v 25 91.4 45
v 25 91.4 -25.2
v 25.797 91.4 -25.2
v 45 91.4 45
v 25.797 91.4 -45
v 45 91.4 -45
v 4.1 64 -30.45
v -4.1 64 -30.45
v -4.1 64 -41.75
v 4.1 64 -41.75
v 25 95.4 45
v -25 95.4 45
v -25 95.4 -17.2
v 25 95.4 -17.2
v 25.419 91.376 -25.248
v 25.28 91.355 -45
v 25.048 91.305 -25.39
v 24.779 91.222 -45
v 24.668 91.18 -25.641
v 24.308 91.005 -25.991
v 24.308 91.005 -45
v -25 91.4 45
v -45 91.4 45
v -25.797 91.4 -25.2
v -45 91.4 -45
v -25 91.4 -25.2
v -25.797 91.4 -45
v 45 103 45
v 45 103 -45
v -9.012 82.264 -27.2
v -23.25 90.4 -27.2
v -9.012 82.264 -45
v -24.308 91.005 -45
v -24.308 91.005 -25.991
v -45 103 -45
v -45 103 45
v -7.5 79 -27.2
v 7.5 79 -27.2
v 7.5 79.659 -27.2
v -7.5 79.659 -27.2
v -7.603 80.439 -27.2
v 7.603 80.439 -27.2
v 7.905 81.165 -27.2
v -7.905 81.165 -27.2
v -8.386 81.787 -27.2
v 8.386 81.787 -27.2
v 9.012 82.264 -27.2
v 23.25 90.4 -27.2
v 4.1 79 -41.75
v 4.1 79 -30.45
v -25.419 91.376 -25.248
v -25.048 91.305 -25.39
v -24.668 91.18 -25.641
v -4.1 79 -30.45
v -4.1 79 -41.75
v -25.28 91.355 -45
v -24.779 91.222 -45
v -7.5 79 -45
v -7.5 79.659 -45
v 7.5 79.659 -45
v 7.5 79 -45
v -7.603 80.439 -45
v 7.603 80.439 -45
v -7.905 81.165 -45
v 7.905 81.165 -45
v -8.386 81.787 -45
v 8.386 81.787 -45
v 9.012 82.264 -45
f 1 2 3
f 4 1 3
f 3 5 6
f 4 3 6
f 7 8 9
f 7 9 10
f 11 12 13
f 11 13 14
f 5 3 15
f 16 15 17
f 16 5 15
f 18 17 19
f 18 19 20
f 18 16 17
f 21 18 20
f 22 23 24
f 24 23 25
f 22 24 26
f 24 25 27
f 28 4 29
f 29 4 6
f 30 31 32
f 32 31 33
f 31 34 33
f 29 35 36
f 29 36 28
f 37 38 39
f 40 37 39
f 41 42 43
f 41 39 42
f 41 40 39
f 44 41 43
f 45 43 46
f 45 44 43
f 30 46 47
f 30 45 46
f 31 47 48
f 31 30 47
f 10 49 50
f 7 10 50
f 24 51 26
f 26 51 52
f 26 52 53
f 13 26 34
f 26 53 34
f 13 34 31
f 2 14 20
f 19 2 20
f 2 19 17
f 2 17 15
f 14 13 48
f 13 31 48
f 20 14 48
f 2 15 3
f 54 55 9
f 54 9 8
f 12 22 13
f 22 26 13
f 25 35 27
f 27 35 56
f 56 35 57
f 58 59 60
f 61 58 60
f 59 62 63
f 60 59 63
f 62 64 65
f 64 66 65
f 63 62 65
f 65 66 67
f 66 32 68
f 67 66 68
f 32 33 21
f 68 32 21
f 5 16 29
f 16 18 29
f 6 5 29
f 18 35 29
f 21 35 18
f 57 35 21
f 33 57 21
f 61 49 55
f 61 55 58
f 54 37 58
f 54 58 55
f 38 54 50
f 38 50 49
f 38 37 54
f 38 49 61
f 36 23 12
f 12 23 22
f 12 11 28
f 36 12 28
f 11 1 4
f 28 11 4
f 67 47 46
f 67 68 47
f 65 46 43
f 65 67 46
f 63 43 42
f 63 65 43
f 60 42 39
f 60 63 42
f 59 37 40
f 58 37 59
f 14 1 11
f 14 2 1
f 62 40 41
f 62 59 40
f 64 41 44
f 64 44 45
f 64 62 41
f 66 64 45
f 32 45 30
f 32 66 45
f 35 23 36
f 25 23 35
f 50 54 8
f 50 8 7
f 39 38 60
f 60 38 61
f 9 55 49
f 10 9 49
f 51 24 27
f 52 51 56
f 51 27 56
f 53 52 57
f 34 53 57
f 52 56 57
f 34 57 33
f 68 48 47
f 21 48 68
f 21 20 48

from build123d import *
from OCP.BRepFilletAPI import BRepFilletAPI_MakeChamfer

# Parameters (mm, degrees)
ESQUISSE2_W             = 90
ESQUISSE2_H             = 90
BOSS_EXTRU_1_DEPTH      = 4
ESQUISSE3_W             = 9.2
ESQUISSE3_H             = 10.3
BOSS_EXTRU_2_DEPTH      = 2.4
CONG_1_R                = 1
ESQUISSE5_W             = 14.85
ESQUISSE5_H             = 90
BOSS_EXTRU_3_DEPTH      = 2.4
ESQUISSE6_W             = 7
ESQUISSE6_H             = 5
BOSS_EXTRU_4_DEPTH      = 38
ESQUISSE8_W             = 14.85
ESQUISSE8_H             = 18
BOSS_EXTRU_5_DEPTH      = 38
BOSS_EXTRU_6_REACH      = 97.814
ESQUISSE9_W             = 7
ESQUISSE9_H             = 2
CONG_1_OF_SYM_TRIE1_R   = 1
ENL_V_MAT_EXTRU_1_REACH = 111.983
ESQUISSE10_W            = 2
ESQUISSE10_H            = 18
ENL_V_MAT_EXTRU_2_REACH = 77.38
ESQUISSE11_W            = 40
ESQUISSE11_H            = 18
ESQUISSE12_W            = 5
ESQUISSE12_H            = 8.6
BOSS_EXTRU_7_DEPTH      = 60.3
ESQUISSE13_W            = 6.9
ESQUISSE13_H            = 7.6
BOSS_EXTRU_8_DEPTH      = 2.45
CONG_2_R                = 1
CONG_2_OF_SYM_TRIE2_R   = 1
BOSS_EXTRU_9_DEPTH      = 3
BOSS_EXTRU_9_DEPTH_BACK = 3
ESQUISSE14_W            = 90
ESQUISSE14_H            = 17.8
ESQUISSE15_W            = 15
ESQUISSE15_H            = 17.8
BOSS_EXTRU_10_DEPTH     = 44
ESQUISSE16_W            = 90
ESQUISSE16_H            = 90
BOSS_EXTRU_11_DEPTH     = 11.6
ESQUISSE20_W            = 12
ESQUISSE20_H            = 6.4
BOSS_EXTRU_13_DEPTH     = 10
ESQUISSE21_W            = 12
ESQUISSE21_H            = 6.4
BOSS_EXTRU_14_DEPTH     = 10
CONG_3_R                = 6
ENL_V_MAT_EXTRU_4_REACH = 126.022
ESQUISSE23_R            = 2.3
CONG_3_OF_SYM_TRIE3_R   = 6
ENL_V_MAT_EXTRU_5_REACH = 126.022
ESQUISSE24_R            = 1.75
ENL_V_MAT_EXTRU_6_REACH = 137.909
ESQUISSE26_R            = 1.75
ESQUISSE27_W            = 50
ESQUISSE27_H            = 4
ENL_V_MAT_EXTRU_7_DEPTH = 72.2
CHANFREIN3_SIZE         = 28.5
CHANFREIN3_SIZE2        = 9.5
CHANFREIN4_SIZE         = 10
CHANFREIN4_SIZE2        = 17.5
CHANFREIN8_START        = -45
CHANFREIN8_DEPTH        = 17.8
CHANFREIN9_SIZE         = 3
CHANFREIN9_SIZE_2       = 9
CHANFREIN10_START       = 25.930676813
CHANFREIN10_OUTLINE_W   = 40
CHANFREIN10_OUTLINE_H   = 3.16227766
CHANFREIN10_DEPTH       = 2.069323187
CONG_9_R                = 3
ESQUISSE37_R            = 4
ENL_V_MAT_EXTRU_8_DEPTH = 3
BOSS_EXTRU_15_DEPTH     = 4.8
CONG_11_R               = 3
CHANFREIN14_SIZE        = 10
CHANFREIN14_SIZE2       = 5
ESQUISSE39_W            = 110.537037217
ESQUISSE39_H            = 103.424550411
ENL_V_MAT_EXTRU_9_DEPTH = 79
ESQUISSE40_W            = 8.2
ESQUISSE40_H            = 11.3
BOSS_EXTRU_16_DEPTH     = 15


with BuildPart() as part:
    # Esquisse2 → Boss.-Extru.1 (new body)
    with BuildSketch(Plane(origin=(0, 0, 0), x_dir=(1, 0, 0), z_dir=(0, 1, 0))):
        Rectangle(ESQUISSE2_W, ESQUISSE2_H)
    extrude(amount=BOSS_EXTRU_1_DEPTH)

    # Esquisse3 → Boss.-Extru.2 (add)
    with BuildSketch(Plane(origin=(0, 4, 0), x_dir=(1, 0, 0), z_dir=(0, 1, 0))):
        with Locations((25.55, -6)):
            Rectangle(ESQUISSE3_W, ESQUISSE3_H)
    boss_extru_2 = extrude(amount=BOSS_EXTRU_2_DEPTH)

    # Congé1
    cong_1_edges = [part.edges().sort_by_distance(p)[0] for p in [
        (20.95, 5.2, 0.85),
        (20.95, 5.2, 11.15),
    ]]
    fillet(cong_1_edges, radius=CONG_1_R)

    # Esquisse5 → Boss.-Extru.3 (add)
    with BuildSketch(Plane(origin=(0, 4, 0), x_dir=(1, 0, 0), z_dir=(0, 1, 0))):
        with Locations((37.575, 0)):
            Rectangle(ESQUISSE5_W, ESQUISSE5_H)
    boss_extru_3 = extrude(amount=BOSS_EXTRU_3_DEPTH)

    # Esquisse6 → Boss.-Extru.4 (add)
    with BuildSketch(Plane(origin=(0, 6.4, 0), x_dir=(1, 0, 0), z_dir=(0, 1, 0))):
        with Locations((33.65, -42.5)):
            Rectangle(ESQUISSE6_W, ESQUISSE6_H)
    boss_extru_4 = extrude(amount=BOSS_EXTRU_4_DEPTH)

    # Esquisse8 → Boss.-Extru.5 (add)
    with BuildSketch(Plane(origin=(0, 6.4, 0), x_dir=(1, 0, 0), z_dir=(0, 1, 0))):
        with Locations((37.575, 36)):
            Rectangle(ESQUISSE8_W, ESQUISSE8_H)
    boss_extru_5 = extrude(amount=BOSS_EXTRU_5_DEPTH)

    # Esquisse9 → Boss.-Extru.6 (add, up to next)
    with BuildSketch(Plane.XY.offset(-27), mode=Mode.PRIVATE) as boss_extru_6_sk1:
        with Locations((33.65, 43.4)):
            Rectangle(ESQUISSE9_W, ESQUISSE9_H)
    boss_extru_6_tool1 = extrude(boss_extru_6_sk1.sketch, amount=BOSS_EXTRU_6_REACH, mode=Mode.PRIVATE) - part.part
    boss_extru_6 = boss_extru_6_tool1.solids().sort_by_distance((33.65, 43.4, -27))[0]
    add(boss_extru_6)

    # Symétrie1: Boss.-Extru.2, Boss.-Extru.3, Boss.-Extru.4, Boss.-Extru.5, Boss.-Extru.6 across plane
    add(boss_extru_2.mirror(Plane(origin=(0, 0, 0), x_dir=(0, 0, 1), z_dir=(1, 0, 0))))
    add(boss_extru_3.mirror(Plane(origin=(0, 0, 0), x_dir=(0, 0, 1), z_dir=(1, 0, 0))))
    add(boss_extru_4.mirror(Plane(origin=(0, 0, 0), x_dir=(0, 0, 1), z_dir=(1, 0, 0))))
    add(boss_extru_5.mirror(Plane(origin=(0, 0, 0), x_dir=(0, 0, 1), z_dir=(1, 0, 0))))
    add(boss_extru_6.mirror(Plane(origin=(0, 0, 0), x_dir=(0, 0, 1), z_dir=(1, 0, 0))))

    # Congé1 of Symétrie1
    cong_1_of_sym_trie1_edges = [part.edges().sort_by_distance(p)[0] for p in [
        (-20.95, 5.2, 0.85),
        (-20.95, 5.2, 11.15),
    ]]
    fillet(cong_1_of_sym_trie1_edges, radius=CONG_1_OF_SYM_TRIE1_R)

    # Esquisse10 → Enlèv. mat.-Extru.1 (cut, up to next)
    with BuildSketch(Plane.XY.offset(45), mode=Mode.PRIVATE) as enl_v_mat_extru_1_sk1:
        with Locations((-31.15, 26.85)):
            Rectangle(ESQUISSE10_W, ESQUISSE10_H)
    enl_v_mat_extru_1_tool1 = extrude(enl_v_mat_extru_1_sk1.sketch, amount=-ENL_V_MAT_EXTRU_1_REACH, mode=Mode.PRIVATE) & part.part
    add(enl_v_mat_extru_1_tool1.solids().sort_by_distance((-31.15, 26.85, 45))[0], mode=Mode.SUBTRACT)

    # Esquisse11 → Enlèv. mat.-Extru.2 (cut, up to next)
    with BuildSketch(Plane(origin=(0, 4, 0), x_dir=(1, 0, 0), z_dir=(0, 1, 0)), mode=Mode.PRIVATE) as enl_v_mat_extru_2_sk1:
        with Locations((0, 36)):
            Rectangle(ESQUISSE11_W, ESQUISSE11_H)
    enl_v_mat_extru_2_tool1 = extrude(enl_v_mat_extru_2_sk1.sketch, amount=-ENL_V_MAT_EXTRU_2_REACH, mode=Mode.PRIVATE) & part.part
    add(enl_v_mat_extru_2_tool1.solids().sort_by_distance((0, 4, -36))[0], mode=Mode.SUBTRACT)

    # Esquisse12 → Boss.-Extru.7 (add)
    with BuildSketch(Plane(origin=(-30.15, 0, 0), x_dir=(0, 0, -1), z_dir=(1, 0, 0))):
        with Locations((29.5, 29.34)):
            Rectangle(ESQUISSE12_W, ESQUISSE12_H)
    extrude(amount=BOSS_EXTRU_7_DEPTH)

    # Esquisse13 → Boss.-Extru.8 (add)
    with BuildSketch(Plane.XY.offset(-27)):
        with Locations((24.4, 29.84)):
            Rectangle(ESQUISSE13_W, ESQUISSE13_H)
    boss_extru_8 = extrude(amount=BOSS_EXTRU_8_DEPTH)

    # Congé2
    cong_2_edges = [part.edges().sort_by_distance(p)[0] for p in [
        (20.95, 33.64, -25.775),
        (20.95, 26.04, -25.775),
    ]]
    fillet(cong_2_edges, radius=CONG_2_R)

    # Symétrie2: Boss.-Extru.8 across plane
    add(boss_extru_8.mirror(Plane(origin=(0, 0, 0), x_dir=(0, 0, 1), z_dir=(1, 0, 0))))

    # Congé2 of Symétrie2
    cong_2_of_sym_trie2_edges = [part.edges().sort_by_distance(p)[0] for p in [
        (-20.95, 33.64, -25.775),
        (-20.95, 26.04, -25.775),
    ]]
    fillet(cong_2_of_sym_trie2_edges, radius=CONG_2_OF_SYM_TRIE2_R)

    # Esquisse14 → Boss.-Extru.9 (add, two sides: drawn at the far end of the back side and taken through both)
    with BuildSketch(Plane(origin=(0, 44.4, 0), x_dir=(1, 0, 0), z_dir=(0, 1, 0)).offset(-BOSS_EXTRU_9_DEPTH_BACK)):
        with Locations((0, 36.1)):
            Rectangle(ESQUISSE14_W, ESQUISSE14_H)
    extrude(amount=BOSS_EXTRU_9_DEPTH + BOSS_EXTRU_9_DEPTH_BACK)

    # Esquisse15 → Boss.-Extru.10 (add)
    with BuildSketch(Plane(origin=(0, 47.4, 0), x_dir=(1, 0, 0), z_dir=(0, 1, 0))):
        with Locations((0, 36.1)):
            Rectangle(ESQUISSE15_W, ESQUISSE15_H)
    extrude(amount=BOSS_EXTRU_10_DEPTH)

    # Esquisse16 → Boss.-Extru.11 (add)
    with BuildSketch(Plane(origin=(0, 91.4, 0), x_dir=(1, 0, 0), z_dir=(0, 1, 0))):
        Rectangle(ESQUISSE16_W, ESQUISSE16_H)
    extrude(amount=BOSS_EXTRU_11_DEPTH)

    # Esquisse20 → Boss.-Extru.13 (add)
    with BuildSketch(Plane(origin=(45, 0, 0), x_dir=(0, 0, -1), z_dir=(1, 0, 0))):
        with Locations((-11, 3.2)):
            Rectangle(ESQUISSE20_W, ESQUISSE20_H)
    boss_extru_13 = extrude(amount=BOSS_EXTRU_13_DEPTH)

    # Esquisse21 → Boss.-Extru.14 (add)
    with BuildSketch(Plane(origin=(0, 0, -45), x_dir=(-1, 0, 0), z_dir=(0, 0, -1))):
        with Locations((-39, 3.2)):
            Rectangle(ESQUISSE21_W, ESQUISSE21_H)
    boss_extru_14 = extrude(amount=BOSS_EXTRU_14_DEPTH)

    # Congé3
    cong_3_edges = [part.edges().sort_by_distance(p)[0] for p in [
        (33, 3.2, -55),
        (45, 3.2, -55),
        (55, 3.2, 5),
        (55, 3.2, 17),
    ]]
    fillet(cong_3_edges, radius=CONG_3_R - 0.0001)  # a hair under: the kernel refuses the full size

    # Esquisse23 → Enlèv. mat.-Extru.4 (cut, up to next)
    with BuildSketch(Plane(origin=(0, 6.4, 0), x_dir=(1, 0, 0), z_dir=(0, 1, 0)), mode=Mode.PRIVATE) as enl_v_mat_extru_4_sk1:
        with Locations(Location((50, -11, 0), (0, 0, 270))):
            Circle(ESQUISSE23_R)
    enl_v_mat_extru_4_tool1 = extrude(enl_v_mat_extru_4_sk1.sketch, amount=-ENL_V_MAT_EXTRU_4_REACH, mode=Mode.PRIVATE) & part.part
    # Esquisse23 → Enlèv. mat.-Extru.4 (cut, up to next)
    with BuildSketch(Plane(origin=(0, 6.4, 0), x_dir=(1, 0, 0), z_dir=(0, 1, 0)), mode=Mode.PRIVATE) as enl_v_mat_extru_4_sk2:
        with Locations(Location((39, 50, 0), (0, 0, 270))):
            Circle(ESQUISSE23_R)
    enl_v_mat_extru_4_tool2 = extrude(enl_v_mat_extru_4_sk2.sketch, amount=-ENL_V_MAT_EXTRU_4_REACH, mode=Mode.PRIVATE) & part.part
    enl_v_mat_extru_4_1 = enl_v_mat_extru_4_tool1.solids().sort_by_distance((50, 6.4, 11))[0]
    add(enl_v_mat_extru_4_1, mode=Mode.SUBTRACT)
    enl_v_mat_extru_4_2 = enl_v_mat_extru_4_tool2.solids().sort_by_distance((39, 6.4, -50))[0]
    add(enl_v_mat_extru_4_2, mode=Mode.SUBTRACT)
    enl_v_mat_extru_4 = enl_v_mat_extru_4_1 + enl_v_mat_extru_4_2  # Enlèv. mat.-Extru.4 as one shape, for the pattern or mirror that repeats it

    # Symétrie3: Boss.-Extru.13, Boss.-Extru.14, Enlèv. mat.-Extru.4 across plane
    add(boss_extru_13.mirror(Plane(origin=(0, 0, 0), x_dir=(0, 0, 1), z_dir=(1, 0, 0))))
    add(boss_extru_14.mirror(Plane(origin=(0, 0, 0), x_dir=(0, 0, 1), z_dir=(1, 0, 0))))
    add(enl_v_mat_extru_4.mirror(Plane(origin=(0, 0, 0), x_dir=(0, 0, 1), z_dir=(1, 0, 0))), mode=Mode.SUBTRACT)

    # Congé3 of Symétrie3
    cong_3_of_sym_trie3_edges = [part.edges().sort_by_distance(p)[0] for p in [
        (-33, 3.2, -55),
        (-45, 3.2, -55),
        (-55, 3.2, 5),
        (-55, 3.2, 17),
    ]]
    fillet(cong_3_of_sym_trie3_edges, radius=CONG_3_OF_SYM_TRIE3_R - 0.0001)  # a hair under: the kernel refuses the full size

    # Esquisse24 → Enlèv. mat.-Extru.5 (cut, up to next)
    with BuildSketch(Plane(origin=(0, 6.4, 0), x_dir=(1, 0, 0), z_dir=(0, 1, 0)), mode=Mode.PRIVATE) as enl_v_mat_extru_5_sk1:
        with Locations(Location((25.45, -6, 0), (0, 0, 270))):
            Circle(ESQUISSE24_R)
    enl_v_mat_extru_5_tool1 = extrude(enl_v_mat_extru_5_sk1.sketch, amount=-ENL_V_MAT_EXTRU_5_REACH, mode=Mode.PRIVATE) & part.part
    enl_v_mat_extru_5 = enl_v_mat_extru_5_tool1.solids().sort_by_distance((25.45, 6.4, 6))[0]
    add(enl_v_mat_extru_5, mode=Mode.SUBTRACT)

    # Esquisse26 → Enlèv. mat.-Extru.6 (cut, up to next)
    with BuildSketch(Plane.XY.offset(-24.55), mode=Mode.PRIVATE) as enl_v_mat_extru_6_sk1:
        with Locations((25.55, 28.44)):
            Circle(ESQUISSE26_R)
    enl_v_mat_extru_6_tool1 = extrude(enl_v_mat_extru_6_sk1.sketch, amount=-ENL_V_MAT_EXTRU_6_REACH, mode=Mode.PRIVATE) & part.part
    enl_v_mat_extru_6 = enl_v_mat_extru_6_tool1.solids().sort_by_distance((25.55, 28.44, -24.55))[0]
    add(enl_v_mat_extru_6, mode=Mode.SUBTRACT)

    # Symétrie5: Enlèv. mat.-Extru.5, Enlèv. mat.-Extru.6 across plane
    add(enl_v_mat_extru_5.mirror(Plane(origin=(0, 0, 0), x_dir=(0, 0, 1), z_dir=(1, 0, 0))), mode=Mode.SUBTRACT)
    add(enl_v_mat_extru_6.mirror(Plane(origin=(0, 0, 0), x_dir=(0, 0, 1), z_dir=(1, 0, 0))), mode=Mode.SUBTRACT)

    # Esquisse27 → Enlèv. mat.-Extru.7 (cut)
    with BuildSketch(Plane.XY.offset(45)):
        with Locations((0, 93.4)):
            Rectangle(ESQUISSE27_W, ESQUISSE27_H)
    extrude(amount=-ENL_V_MAT_EXTRU_7_DEPTH, mode=Mode.SUBTRACT)

    # Chanfrein3: one chamfer whose edges measure the first distance from different faces: ONE call of the kernel's chamfer builder (chamfer() names one face for all edges)
    chanfrein3_edges_1 = [part.edges().sort_by_distance(p)[0] for p in [
        (-7.5, 47.4, -36.1),
    ]]
    chanfrein3_side_1 = [part.faces().sort_by_distance(p)[0] for p in [
        (-26.25, 47.4, -36.1),
    ]]
    chanfrein3_edges_2 = [part.edges().sort_by_distance(p)[0] for p in [
        (7.5, 47.4, -36.1),
    ]]
    chanfrein3_side_2 = [part.faces().sort_by_distance(p)[0] for p in [
        (26.25, 47.4, -36.1),
    ]]
    chanfrein3 = BRepFilletAPI_MakeChamfer(part.part.solid().wrapped)
    for e in chanfrein3_edges_1:
        chanfrein3.Add(CHANFREIN3_SIZE, CHANFREIN3_SIZE2, e.wrapped, chanfrein3_side_1[0].wrapped)  # the first distance lies on this face
    for e in chanfrein3_edges_2:
        chanfrein3.Add(CHANFREIN3_SIZE, CHANFREIN3_SIZE2, e.wrapped, chanfrein3_side_2[0].wrapped)  # the first distance lies on this face
    add(Compound.cast(chanfrein3.Shape()), mode=Mode.REPLACE)

    # Chanfrein4: one chamfer whose edges measure the first distance from different faces: ONE call of the kernel's chamfer builder (chamfer() names one face for all edges)
    chanfrein4_edges_1 = [part.edges().sort_by_distance(p)[0] for p in [
        (7.5, 91.4, -36.1),
    ]]
    chanfrein4_side_1 = [part.faces().sort_by_distance(p)[0] for p in [
        (7.5, 74.15, -36.1),
    ]]
    chanfrein4_edges_2 = [part.edges().sort_by_distance(p)[0] for p in [
        (-7.5, 91.4, -36.1),
    ]]
    chanfrein4_side_2 = [part.faces().sort_by_distance(p)[0] for p in [
        (-7.5, 74.15, -36.1),
    ]]
    chanfrein4 = BRepFilletAPI_MakeChamfer(part.part.solid().wrapped)
    for e in chanfrein4_edges_1:
        chanfrein4.Add(CHANFREIN4_SIZE, CHANFREIN4_SIZE2, e.wrapped, chanfrein4_side_1[0].wrapped)  # the first distance lies on this face
    for e in chanfrein4_edges_2:
        chanfrein4.Add(CHANFREIN4_SIZE, CHANFREIN4_SIZE2, e.wrapped, chanfrein4_side_2[0].wrapped)  # the first distance lies on this face
    add(Compound.cast(chanfrein4.Shape()), mode=Mode.REPLACE)

    # Chanfrein8: read off the stored shape, not the designer's step
    # Chanfrein8 outline → Chanfrein8 (add)
    with BuildSketch(Plane.XY.offset(CHANFREIN8_START)):
        Polygon((30.15, 31.35), (30.15, 41.4), (0, 41.4), align=None)
    extrude(amount=CHANFREIN8_DEPTH)

    # Chanfrein9
    chanfrein9_edges_1 = [part.edges().sort_by_distance(p)[0] for p in [
        (45, 47.4, -36.1),
    ]]
    chanfrein9_side_1 = [part.faces().sort_by_distance(p)[0] for p in [
        (45, 47.34, -36.1),
    ]]
    chanfrein9_edges_2 = [part.edges().sort_by_distance(p)[0] for p in [
        (-45, 47.4, -36.1),
    ]]
    chanfrein9_side_2 = [part.faces().sort_by_distance(p)[0] for p in [
        (-44.94, 47.4, -36.1),
    ]]
    chanfrein9 = BRepFilletAPI_MakeChamfer(part.part.solid().wrapped)
    for e in chanfrein9_edges_1:
        chanfrein9.Add(CHANFREIN9_SIZE - 0.0001, CHANFREIN9_SIZE_2 - 0.0001, e.wrapped, chanfrein9_side_1[0].wrapped)
    for e in chanfrein9_edges_2:
        chanfrein9.Add(CHANFREIN9_SIZE_2 - 0.0001, CHANFREIN9_SIZE - 0.0001, e.wrapped, chanfrein9_side_2[0].wrapped)
    add(Compound.cast(chanfrein9.Shape()), mode=Mode.REPLACE)  # a hair under: the kernel refuses the full size

    # Chanfrein10: read off the stored shape, not the designer's step
    # Chanfrein10 outline → Chanfrein10 (cut)
    with BuildSketch(Plane(origin=(0, 0, 0), x_dir=(1, 0, 0), z_dir=(0, 0.31622776601683705, -0.9486832980505141)).offset(CHANFREIN10_START)):
        with Locations((0, 6.008327554)):
            Rectangle(CHANFREIN10_OUTLINE_W, CHANFREIN10_OUTLINE_H)
    extrude(amount=CHANFREIN10_DEPTH, mode=Mode.SUBTRACT)

    # Congé9
    cong_9_edges = [part.edges().sort_by_distance(p)[0] for p in [
        (-33.65, 44.4, 45),
        (-33.65, 6.4, 40),
        (-37.575, 6.4, -27),
        (-33.65, 42.4, 40),
        (-33.65, 42.4, -27),
        (33.65, 6.4, 40),
        (33.65, 44.4, 45),
        (37.575, 6.4, -27),
        (33.65, 42.4, 40),
        (33.65, 42.4, -27),
    ]]
    fillet(cong_9_edges, radius=CONG_9_R)

    # Chanfrein13
    # the kernel refuses this chamfer: 31.5, 10.5 mm, written as the material it adds along each edge
    with BuildSketch(Plane(origin=(-30.15, 41.4, -27.2), x_dir=(0, -1, 0), z_dir=(0, 0, -1))) as chanfrein13_piece_1:
        with BuildLine():
            Line((10.898446985, 1.195340956), (-0.398446985, -32.695340956))
            Line((-0.398446985, -32.695340956), (-1.028446985, -32.695340956))
            ThreePointArc((-1.028446985, -32.695340956), (-0.63, -16.347670478), (-0.63, 0))
            Line((-0.63, 0), (0, 0.63))
            ThreePointArc((0, 0.63), (5.449223493, 0.63), (10.898446985, 1.825340956))
            Line((10.898446985, 1.825340956), (10.898446985, 1.195340956))
        make_face()
    extrude(amount=17.8)

    # Esquisse37 → Enlèv. mat.-Extru.8 (cut)
    with BuildSketch(Plane.XZ):
        with Locations(Location((-25.45, 6, 0), (0, 0, 270))):
            Circle(ESQUISSE37_R)
        with Locations(Location((25.45, 6, 0), (0, 0, 270))):
            Circle(ESQUISSE37_R)
    extrude(amount=-ENL_V_MAT_EXTRU_8_DEPTH, mode=Mode.SUBTRACT)

    # Esquisse38 → Boss.-Extru.15 (add)
    with BuildSketch(Plane.XY.offset(-27.2)):
        Polygon((0.675, 41.175), (-21.95, 33.64), (23.28, 33.64), align=None)
    extrude(amount=-BOSS_EXTRU_15_DEPTH)

    # Congé11
    cong_11_edges = [part.edges().sort_by_distance(p)[0] for p in [
        (7.5, 56.9, -36.1),
        (-7.5, 56.9, -36.1),
        (-25, 91.4, -36.1),
        (-7.5, 81.4, -36.1),
        (25, 91.4, -36.1),
        (7.5, 81.4, -36.1),
        (30.15, 31.35, -38.5),
        (-30.15, 30.9, -38.5),
        (0.675, 41.175, -38.5),
    ]]
    fillet(cong_11_edges, radius=CONG_11_R)

    # Chanfrein14
    chanfrein14_edges = [part.edges().sort_by_distance(p)[0] for p in [
        (0, 95.4, -27.2),
    ]]
    chanfrein14_side = [part.faces().sort_by_distance(p)[0] for p in [
        (0, 95.4, 8.9),
    ]]
    chamfer(chanfrein14_edges, length=CHANFREIN14_SIZE, length2=CHANFREIN14_SIZE2, reference=chanfrein14_side[0])

    # Esquisse39 → Enlèv. mat.-Extru.9 (cut)
    with BuildSketch(Plane.XZ):
        with Locations((-0.268518609, -4.614943927)):
            Rectangle(ESQUISSE39_W, ESQUISSE39_H)
    extrude(amount=-ENL_V_MAT_EXTRU_9_DEPTH, mode=Mode.SUBTRACT)

    # Esquisse40 → Boss.-Extru.16 (add)
    with BuildSketch(Plane.XZ.offset(-79)):
        with Locations((0, -36.1)):
            Rectangle(ESQUISSE40_W, ESQUISSE40_H)
    extrude(amount=BOSS_EXTRU_16_DEPTH)


solid = part.part
